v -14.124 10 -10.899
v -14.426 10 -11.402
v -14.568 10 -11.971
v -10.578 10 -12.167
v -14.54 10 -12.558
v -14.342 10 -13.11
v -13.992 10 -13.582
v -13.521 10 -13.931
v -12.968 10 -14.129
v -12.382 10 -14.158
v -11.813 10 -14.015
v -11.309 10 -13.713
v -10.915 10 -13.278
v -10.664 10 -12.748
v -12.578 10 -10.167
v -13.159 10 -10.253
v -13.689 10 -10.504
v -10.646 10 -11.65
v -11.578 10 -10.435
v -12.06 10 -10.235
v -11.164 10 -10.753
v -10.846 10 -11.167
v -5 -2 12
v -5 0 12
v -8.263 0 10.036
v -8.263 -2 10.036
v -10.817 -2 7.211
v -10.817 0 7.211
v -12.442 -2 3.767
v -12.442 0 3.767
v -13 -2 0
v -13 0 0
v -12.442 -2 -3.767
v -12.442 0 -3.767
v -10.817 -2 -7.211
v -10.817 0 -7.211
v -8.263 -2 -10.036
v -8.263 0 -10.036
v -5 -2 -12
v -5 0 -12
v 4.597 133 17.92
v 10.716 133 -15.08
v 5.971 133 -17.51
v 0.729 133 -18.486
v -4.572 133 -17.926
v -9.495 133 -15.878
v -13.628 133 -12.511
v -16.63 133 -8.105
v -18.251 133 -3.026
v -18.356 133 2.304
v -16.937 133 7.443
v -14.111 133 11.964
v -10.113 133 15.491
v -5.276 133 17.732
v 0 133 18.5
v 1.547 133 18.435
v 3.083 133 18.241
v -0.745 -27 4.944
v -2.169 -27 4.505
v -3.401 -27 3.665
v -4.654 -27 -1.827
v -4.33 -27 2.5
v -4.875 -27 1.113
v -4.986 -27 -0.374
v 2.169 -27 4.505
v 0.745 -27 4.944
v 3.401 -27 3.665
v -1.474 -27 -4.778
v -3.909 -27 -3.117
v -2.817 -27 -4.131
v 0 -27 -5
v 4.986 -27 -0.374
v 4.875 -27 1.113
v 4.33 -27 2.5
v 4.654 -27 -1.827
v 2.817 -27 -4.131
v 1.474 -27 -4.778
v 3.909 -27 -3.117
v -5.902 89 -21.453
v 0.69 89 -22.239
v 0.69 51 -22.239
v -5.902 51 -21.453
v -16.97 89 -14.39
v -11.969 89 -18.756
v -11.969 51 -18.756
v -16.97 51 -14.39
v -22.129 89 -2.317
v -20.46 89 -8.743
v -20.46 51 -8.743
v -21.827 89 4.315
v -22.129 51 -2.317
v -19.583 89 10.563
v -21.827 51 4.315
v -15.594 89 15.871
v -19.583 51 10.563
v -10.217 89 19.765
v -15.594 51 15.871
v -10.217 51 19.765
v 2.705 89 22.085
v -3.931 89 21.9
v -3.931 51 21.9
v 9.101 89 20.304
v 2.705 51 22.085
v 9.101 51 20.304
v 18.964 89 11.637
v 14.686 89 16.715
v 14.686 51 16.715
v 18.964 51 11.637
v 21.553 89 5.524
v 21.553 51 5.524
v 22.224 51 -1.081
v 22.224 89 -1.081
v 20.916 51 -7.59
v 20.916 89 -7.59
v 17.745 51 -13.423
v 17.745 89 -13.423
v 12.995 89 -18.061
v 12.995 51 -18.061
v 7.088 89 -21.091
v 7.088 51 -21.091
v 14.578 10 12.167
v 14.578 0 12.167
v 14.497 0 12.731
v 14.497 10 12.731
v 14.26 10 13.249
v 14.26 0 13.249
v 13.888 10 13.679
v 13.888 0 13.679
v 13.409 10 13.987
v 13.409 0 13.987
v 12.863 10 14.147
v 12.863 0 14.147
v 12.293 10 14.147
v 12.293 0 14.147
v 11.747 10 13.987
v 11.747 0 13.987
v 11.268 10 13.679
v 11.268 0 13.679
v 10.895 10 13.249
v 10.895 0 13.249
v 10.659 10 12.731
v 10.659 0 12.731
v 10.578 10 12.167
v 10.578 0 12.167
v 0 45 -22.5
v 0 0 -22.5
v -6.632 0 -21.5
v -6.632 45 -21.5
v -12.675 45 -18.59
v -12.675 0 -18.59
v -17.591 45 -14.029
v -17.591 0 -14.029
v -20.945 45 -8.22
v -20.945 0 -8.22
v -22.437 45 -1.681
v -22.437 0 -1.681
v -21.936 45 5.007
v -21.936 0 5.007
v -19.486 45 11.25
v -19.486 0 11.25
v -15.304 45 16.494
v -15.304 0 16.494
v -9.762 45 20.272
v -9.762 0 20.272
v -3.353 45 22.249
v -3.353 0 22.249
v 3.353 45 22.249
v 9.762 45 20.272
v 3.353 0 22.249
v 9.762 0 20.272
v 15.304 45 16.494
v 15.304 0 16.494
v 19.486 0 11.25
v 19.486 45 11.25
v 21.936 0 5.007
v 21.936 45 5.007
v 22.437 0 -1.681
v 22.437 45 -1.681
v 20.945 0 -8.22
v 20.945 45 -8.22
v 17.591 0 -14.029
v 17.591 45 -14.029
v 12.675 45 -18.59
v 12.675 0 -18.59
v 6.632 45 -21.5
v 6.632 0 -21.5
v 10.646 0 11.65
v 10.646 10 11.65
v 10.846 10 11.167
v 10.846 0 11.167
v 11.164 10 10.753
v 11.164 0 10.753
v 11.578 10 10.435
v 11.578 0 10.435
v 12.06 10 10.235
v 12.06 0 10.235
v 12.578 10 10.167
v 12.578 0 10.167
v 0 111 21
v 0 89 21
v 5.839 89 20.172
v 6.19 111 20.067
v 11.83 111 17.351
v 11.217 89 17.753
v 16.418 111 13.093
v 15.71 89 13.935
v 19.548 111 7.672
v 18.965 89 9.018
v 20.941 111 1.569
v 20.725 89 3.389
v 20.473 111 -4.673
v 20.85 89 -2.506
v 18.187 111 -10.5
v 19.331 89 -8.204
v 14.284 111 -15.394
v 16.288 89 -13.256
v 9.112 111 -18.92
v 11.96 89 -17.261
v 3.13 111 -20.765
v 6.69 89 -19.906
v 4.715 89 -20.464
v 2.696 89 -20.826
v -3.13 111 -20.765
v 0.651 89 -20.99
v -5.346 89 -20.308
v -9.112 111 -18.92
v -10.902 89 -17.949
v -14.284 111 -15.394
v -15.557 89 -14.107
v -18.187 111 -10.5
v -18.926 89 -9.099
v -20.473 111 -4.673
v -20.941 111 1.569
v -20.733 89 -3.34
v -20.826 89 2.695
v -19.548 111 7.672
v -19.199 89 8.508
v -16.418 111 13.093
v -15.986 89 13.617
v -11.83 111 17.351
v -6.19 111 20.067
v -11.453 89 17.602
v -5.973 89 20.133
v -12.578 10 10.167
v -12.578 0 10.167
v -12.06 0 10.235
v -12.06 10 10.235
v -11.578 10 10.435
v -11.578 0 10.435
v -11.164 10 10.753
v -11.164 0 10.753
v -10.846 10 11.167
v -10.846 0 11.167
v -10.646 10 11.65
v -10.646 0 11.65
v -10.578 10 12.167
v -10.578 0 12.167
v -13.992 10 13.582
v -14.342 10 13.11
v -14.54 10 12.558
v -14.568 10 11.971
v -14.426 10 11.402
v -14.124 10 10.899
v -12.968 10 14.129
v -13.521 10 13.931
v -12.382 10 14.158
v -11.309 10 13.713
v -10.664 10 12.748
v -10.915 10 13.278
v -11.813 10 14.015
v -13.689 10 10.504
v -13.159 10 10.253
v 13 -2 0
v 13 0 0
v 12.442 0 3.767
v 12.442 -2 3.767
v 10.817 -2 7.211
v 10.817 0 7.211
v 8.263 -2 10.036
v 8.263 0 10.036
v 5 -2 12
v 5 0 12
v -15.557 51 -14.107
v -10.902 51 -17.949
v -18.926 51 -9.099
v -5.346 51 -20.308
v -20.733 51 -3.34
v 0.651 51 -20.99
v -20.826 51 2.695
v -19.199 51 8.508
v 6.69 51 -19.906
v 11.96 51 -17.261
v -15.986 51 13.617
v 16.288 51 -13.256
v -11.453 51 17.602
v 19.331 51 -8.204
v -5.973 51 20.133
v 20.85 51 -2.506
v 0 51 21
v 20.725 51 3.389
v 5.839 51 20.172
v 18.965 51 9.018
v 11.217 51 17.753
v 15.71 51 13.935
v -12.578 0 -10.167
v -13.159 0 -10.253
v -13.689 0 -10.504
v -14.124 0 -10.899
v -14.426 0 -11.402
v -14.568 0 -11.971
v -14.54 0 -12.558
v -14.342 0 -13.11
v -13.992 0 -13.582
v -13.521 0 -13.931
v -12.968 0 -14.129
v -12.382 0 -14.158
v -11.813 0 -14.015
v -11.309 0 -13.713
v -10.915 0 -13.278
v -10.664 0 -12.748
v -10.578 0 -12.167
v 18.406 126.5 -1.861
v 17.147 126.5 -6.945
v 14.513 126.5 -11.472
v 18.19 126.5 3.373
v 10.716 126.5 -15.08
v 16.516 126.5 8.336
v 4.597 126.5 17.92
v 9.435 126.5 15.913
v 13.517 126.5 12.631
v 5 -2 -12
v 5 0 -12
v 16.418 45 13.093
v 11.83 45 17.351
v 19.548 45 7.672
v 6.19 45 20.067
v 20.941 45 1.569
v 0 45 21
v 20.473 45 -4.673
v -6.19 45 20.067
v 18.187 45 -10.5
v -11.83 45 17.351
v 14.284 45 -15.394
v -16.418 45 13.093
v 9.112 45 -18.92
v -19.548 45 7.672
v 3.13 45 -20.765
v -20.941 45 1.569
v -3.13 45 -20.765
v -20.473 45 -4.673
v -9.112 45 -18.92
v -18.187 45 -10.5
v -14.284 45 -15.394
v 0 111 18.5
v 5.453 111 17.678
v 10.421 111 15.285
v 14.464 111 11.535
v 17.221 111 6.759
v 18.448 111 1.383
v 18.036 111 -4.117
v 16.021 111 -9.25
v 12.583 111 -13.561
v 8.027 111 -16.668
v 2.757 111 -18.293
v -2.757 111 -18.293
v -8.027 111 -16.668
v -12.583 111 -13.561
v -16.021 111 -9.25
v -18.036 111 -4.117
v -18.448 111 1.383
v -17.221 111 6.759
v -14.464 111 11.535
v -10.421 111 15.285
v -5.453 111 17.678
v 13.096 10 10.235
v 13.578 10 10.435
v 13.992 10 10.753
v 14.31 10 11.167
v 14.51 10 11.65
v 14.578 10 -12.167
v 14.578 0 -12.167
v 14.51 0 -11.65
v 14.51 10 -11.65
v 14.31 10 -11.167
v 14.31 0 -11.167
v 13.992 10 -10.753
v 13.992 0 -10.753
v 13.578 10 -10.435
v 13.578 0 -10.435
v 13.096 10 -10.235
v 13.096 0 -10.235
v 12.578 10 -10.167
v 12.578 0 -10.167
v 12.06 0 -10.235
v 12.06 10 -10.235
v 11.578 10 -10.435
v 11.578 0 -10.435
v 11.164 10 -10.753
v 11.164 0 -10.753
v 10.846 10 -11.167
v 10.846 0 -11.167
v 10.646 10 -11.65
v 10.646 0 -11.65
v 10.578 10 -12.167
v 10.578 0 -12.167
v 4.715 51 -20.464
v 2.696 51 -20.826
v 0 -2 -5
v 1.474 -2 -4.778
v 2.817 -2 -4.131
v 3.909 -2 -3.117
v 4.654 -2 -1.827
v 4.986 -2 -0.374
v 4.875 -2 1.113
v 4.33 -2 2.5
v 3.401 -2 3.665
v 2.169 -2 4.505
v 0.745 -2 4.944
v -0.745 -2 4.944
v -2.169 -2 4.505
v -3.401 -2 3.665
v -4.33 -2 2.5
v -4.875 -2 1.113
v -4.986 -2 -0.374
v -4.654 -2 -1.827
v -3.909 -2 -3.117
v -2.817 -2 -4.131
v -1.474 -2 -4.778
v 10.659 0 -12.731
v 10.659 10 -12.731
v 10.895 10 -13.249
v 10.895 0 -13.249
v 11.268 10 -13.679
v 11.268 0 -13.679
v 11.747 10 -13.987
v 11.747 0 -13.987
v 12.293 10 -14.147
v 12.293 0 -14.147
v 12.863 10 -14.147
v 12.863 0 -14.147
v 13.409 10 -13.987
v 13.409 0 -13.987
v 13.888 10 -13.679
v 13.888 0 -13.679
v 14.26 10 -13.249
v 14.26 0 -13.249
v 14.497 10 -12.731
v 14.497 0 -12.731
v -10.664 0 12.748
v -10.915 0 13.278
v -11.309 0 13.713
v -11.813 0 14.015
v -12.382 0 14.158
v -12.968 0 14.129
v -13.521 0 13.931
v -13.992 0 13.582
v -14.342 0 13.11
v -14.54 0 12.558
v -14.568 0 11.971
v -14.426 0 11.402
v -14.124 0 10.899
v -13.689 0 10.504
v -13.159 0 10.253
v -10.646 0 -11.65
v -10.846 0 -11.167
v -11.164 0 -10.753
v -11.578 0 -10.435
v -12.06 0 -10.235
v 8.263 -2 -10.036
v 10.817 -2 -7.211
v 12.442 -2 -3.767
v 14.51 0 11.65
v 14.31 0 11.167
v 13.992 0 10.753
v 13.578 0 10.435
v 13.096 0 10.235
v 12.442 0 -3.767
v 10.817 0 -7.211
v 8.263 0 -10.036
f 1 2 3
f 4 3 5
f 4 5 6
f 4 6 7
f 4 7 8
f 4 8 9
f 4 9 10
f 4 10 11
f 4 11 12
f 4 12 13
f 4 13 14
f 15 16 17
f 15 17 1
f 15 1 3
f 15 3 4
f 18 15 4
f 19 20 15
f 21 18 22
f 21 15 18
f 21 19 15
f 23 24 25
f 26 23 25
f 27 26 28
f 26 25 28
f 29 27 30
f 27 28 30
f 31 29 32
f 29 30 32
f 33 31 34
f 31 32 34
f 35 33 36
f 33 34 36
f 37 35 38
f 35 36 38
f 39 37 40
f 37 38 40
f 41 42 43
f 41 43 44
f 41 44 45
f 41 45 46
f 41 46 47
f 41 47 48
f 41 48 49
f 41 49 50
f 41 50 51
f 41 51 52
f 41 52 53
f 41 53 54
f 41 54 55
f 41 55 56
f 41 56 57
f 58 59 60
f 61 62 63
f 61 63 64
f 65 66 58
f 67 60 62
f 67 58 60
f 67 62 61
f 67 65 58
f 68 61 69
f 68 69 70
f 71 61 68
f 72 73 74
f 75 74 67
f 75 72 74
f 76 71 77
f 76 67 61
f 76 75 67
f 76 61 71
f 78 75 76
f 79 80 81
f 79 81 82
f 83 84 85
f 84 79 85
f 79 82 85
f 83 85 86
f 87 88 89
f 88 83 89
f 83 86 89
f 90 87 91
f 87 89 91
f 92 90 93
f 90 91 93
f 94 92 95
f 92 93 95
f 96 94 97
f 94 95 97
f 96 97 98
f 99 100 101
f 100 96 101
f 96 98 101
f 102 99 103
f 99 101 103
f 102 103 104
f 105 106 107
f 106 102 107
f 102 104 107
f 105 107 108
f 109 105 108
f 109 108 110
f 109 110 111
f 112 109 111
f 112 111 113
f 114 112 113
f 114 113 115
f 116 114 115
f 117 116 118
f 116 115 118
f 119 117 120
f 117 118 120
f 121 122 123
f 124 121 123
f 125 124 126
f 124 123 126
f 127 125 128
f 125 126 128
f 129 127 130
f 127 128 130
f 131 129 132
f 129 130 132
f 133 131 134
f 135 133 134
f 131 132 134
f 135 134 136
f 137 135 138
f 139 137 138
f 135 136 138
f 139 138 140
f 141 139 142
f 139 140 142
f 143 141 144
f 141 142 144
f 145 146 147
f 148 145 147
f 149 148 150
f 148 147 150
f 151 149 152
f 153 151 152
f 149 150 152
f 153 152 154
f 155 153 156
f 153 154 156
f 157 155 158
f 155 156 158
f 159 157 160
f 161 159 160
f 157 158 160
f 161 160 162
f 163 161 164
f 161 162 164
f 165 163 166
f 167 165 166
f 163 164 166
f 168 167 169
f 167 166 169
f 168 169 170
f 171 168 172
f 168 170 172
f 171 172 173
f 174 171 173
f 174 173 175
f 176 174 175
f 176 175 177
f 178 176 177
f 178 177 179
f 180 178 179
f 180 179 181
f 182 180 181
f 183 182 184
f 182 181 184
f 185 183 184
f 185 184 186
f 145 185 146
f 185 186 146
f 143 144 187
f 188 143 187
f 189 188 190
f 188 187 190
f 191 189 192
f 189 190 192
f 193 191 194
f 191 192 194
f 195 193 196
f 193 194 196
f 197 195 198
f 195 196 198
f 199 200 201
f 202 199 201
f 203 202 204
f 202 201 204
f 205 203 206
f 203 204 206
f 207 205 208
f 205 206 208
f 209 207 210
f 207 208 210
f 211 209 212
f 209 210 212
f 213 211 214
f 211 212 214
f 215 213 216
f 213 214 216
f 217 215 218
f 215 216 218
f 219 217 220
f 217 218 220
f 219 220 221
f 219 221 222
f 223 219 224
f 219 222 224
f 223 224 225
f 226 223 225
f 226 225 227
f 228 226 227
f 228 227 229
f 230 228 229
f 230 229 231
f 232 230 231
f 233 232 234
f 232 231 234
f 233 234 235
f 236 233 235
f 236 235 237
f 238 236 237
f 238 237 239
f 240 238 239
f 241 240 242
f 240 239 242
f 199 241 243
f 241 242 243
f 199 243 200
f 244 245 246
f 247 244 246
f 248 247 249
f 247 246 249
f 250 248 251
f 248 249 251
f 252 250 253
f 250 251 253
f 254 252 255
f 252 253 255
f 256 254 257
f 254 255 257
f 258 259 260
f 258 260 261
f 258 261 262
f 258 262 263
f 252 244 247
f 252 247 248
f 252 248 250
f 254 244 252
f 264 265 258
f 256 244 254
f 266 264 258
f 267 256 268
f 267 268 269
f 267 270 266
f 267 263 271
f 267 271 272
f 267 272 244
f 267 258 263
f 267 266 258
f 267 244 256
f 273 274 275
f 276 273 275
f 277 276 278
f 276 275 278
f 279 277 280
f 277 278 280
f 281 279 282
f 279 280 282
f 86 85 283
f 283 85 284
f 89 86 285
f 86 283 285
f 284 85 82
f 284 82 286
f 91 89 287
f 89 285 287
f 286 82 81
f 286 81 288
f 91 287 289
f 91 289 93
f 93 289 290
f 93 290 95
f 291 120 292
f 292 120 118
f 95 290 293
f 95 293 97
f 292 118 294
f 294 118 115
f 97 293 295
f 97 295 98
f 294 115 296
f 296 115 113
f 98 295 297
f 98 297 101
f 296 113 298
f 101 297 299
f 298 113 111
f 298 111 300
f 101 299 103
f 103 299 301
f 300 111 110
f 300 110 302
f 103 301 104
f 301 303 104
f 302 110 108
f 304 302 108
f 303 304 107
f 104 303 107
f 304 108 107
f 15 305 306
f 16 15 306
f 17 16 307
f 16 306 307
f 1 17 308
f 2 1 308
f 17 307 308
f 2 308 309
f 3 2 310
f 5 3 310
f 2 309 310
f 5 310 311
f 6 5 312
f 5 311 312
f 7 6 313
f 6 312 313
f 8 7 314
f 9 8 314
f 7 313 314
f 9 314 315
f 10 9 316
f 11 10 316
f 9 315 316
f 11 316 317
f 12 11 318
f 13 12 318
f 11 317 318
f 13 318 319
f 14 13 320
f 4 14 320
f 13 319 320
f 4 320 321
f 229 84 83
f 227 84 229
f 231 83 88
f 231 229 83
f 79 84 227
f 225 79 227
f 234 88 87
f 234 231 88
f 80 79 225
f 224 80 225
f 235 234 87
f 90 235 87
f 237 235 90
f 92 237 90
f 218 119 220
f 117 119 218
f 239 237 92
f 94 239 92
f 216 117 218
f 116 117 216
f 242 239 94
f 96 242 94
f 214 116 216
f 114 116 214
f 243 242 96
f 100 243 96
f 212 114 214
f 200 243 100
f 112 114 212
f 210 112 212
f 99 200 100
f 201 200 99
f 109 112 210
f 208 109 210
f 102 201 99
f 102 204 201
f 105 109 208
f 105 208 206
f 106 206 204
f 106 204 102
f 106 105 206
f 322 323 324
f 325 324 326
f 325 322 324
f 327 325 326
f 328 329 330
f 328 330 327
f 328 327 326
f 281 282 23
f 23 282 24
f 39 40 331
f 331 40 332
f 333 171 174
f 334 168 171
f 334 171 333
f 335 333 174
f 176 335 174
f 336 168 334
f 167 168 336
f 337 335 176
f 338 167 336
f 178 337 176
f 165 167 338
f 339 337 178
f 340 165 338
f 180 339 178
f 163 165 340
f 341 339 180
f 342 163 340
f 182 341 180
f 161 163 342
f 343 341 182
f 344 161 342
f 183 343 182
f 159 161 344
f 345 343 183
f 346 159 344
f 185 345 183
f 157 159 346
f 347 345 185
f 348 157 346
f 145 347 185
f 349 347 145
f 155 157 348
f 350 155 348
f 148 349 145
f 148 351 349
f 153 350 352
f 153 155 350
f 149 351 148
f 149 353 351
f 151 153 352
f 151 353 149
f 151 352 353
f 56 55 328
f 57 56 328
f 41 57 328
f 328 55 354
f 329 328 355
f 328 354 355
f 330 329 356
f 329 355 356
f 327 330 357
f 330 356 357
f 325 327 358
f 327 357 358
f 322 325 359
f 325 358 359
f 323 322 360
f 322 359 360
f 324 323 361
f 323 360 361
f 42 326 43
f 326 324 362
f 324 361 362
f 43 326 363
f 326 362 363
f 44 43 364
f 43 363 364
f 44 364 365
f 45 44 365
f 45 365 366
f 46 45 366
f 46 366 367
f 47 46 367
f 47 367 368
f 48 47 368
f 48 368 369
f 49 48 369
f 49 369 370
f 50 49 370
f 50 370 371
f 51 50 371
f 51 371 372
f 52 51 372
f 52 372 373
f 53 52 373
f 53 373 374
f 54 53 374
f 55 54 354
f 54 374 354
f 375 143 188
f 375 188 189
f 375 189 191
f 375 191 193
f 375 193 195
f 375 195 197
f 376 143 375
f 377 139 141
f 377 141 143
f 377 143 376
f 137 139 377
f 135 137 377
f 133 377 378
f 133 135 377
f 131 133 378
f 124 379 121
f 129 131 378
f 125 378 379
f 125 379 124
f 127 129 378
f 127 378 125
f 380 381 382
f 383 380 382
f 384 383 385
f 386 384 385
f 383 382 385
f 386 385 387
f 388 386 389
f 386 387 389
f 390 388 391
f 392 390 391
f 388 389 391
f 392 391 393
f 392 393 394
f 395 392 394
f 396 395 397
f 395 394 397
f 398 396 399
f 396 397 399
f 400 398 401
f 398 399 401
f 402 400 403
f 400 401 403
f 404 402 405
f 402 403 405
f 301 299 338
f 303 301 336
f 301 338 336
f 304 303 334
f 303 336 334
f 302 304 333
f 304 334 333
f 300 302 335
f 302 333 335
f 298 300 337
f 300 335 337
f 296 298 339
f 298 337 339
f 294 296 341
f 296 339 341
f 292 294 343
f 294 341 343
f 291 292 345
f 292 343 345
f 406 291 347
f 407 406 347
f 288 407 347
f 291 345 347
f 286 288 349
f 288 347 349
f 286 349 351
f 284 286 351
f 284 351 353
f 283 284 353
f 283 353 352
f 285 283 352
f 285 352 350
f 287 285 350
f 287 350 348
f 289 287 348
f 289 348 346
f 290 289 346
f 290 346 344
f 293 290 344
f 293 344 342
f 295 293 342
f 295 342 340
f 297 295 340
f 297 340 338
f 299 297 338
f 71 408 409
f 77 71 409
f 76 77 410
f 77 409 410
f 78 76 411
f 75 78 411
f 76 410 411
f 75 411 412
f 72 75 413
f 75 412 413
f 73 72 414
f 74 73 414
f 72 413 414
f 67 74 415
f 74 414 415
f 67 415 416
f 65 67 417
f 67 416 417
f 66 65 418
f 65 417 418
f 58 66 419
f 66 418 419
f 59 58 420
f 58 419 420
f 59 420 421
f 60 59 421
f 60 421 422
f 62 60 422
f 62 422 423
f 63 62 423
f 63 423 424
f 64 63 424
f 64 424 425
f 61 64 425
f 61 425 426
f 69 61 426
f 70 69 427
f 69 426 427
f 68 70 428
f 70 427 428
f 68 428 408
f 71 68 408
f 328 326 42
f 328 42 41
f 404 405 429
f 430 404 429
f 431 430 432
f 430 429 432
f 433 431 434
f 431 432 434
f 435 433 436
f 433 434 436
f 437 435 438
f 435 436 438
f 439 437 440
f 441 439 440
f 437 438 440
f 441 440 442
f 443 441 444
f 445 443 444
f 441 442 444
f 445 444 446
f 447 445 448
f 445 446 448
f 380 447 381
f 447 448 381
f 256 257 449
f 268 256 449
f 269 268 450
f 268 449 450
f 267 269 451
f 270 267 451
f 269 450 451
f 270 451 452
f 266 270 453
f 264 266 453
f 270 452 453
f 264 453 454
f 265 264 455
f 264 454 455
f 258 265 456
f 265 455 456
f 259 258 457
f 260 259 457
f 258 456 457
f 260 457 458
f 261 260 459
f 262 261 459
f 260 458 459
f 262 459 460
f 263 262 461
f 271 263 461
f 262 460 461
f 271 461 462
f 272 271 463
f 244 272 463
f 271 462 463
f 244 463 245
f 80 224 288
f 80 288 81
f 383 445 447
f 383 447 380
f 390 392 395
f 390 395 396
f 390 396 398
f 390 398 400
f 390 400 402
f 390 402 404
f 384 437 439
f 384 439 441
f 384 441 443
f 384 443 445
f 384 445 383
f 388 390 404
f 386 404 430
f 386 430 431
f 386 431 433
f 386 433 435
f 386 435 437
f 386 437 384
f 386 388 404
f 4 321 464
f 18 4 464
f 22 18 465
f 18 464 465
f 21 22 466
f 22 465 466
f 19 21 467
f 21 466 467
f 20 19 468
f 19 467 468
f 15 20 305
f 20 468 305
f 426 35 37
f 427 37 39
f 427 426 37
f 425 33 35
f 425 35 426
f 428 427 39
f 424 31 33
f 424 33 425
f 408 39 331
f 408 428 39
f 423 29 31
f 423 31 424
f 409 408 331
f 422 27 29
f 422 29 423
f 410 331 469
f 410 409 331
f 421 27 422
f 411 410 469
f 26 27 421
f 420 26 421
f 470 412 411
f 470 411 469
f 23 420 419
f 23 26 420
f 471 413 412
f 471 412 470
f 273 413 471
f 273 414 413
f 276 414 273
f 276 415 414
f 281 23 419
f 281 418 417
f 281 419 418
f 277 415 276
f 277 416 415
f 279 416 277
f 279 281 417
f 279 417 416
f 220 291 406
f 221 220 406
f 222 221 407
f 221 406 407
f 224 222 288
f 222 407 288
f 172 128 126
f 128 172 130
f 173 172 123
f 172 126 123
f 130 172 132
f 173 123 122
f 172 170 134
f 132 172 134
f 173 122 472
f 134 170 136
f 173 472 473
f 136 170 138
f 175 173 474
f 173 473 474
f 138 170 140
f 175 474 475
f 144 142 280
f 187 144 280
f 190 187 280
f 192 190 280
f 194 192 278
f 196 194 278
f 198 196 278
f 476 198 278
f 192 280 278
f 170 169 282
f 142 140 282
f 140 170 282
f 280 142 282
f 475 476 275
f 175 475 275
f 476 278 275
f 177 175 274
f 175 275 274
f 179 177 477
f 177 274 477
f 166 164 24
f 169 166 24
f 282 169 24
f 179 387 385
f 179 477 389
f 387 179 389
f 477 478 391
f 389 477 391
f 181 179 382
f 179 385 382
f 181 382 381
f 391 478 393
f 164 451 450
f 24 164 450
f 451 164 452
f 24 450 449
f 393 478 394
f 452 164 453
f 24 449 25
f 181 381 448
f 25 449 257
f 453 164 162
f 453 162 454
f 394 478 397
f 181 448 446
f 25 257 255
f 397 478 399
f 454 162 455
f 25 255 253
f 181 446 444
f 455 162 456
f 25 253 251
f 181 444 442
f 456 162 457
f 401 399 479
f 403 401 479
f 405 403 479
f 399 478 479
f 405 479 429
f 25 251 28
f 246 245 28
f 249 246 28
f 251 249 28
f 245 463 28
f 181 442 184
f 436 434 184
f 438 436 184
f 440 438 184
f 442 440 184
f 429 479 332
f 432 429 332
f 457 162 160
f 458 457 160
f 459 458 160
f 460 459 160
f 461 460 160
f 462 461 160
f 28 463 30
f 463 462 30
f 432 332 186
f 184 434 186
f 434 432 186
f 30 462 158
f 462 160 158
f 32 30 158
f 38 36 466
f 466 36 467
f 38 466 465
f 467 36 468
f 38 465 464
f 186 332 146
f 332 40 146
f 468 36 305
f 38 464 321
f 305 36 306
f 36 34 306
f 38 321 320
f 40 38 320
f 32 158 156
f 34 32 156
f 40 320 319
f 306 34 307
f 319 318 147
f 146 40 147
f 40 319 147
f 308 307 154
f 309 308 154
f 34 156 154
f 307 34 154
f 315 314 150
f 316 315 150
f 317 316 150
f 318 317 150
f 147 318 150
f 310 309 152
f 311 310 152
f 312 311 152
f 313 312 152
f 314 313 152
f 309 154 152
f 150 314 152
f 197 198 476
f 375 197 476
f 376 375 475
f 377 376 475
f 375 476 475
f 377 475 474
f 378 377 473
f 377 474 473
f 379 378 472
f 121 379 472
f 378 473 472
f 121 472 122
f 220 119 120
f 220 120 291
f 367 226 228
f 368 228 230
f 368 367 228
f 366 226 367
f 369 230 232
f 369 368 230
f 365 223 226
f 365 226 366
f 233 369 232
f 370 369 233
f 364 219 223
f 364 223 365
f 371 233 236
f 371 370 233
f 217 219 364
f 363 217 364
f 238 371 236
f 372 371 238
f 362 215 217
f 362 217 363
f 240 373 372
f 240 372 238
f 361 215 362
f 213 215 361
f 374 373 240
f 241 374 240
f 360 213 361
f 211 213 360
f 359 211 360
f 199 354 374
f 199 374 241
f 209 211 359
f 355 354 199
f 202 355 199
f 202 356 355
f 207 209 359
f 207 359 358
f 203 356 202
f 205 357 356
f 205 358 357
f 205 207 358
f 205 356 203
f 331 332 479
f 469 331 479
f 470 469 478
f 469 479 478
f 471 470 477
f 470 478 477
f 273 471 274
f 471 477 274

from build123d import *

# Parameters (mm, degrees)
SKETCH5_R            = 22.5
BOSS_EXTRUDE4_DEPTH  = 45
SKETCH6_R            = 21
BOSS_EXTRUDE5_DEPTH  = 6
SKETCH7_R            = 22.25
BOSS_EXTRUDE6_DEPTH  = 38
SKETCH8_R            = 21
BOSS_EXTRUDE7_DEPTH  = 22
SKETCH9_R            = 18.5
BOSS_EXTRUDE9_DEPTH  = 22
CUT_EXTRUDE1_START   = -6.5
CUT_EXTRUDE1_DEPTH   = 6.5
CUT_EXTRUDE3_START   = -38
CUT_EXTRUDE3_DEPTH   = 38
BOSS_EXTRUDE11_DEPTH = 2
SKETCH19_R           = 5
BOSS_EXTRUDE12_DEPTH = 25
CUT_EXTRUDE4_DEPTH   = 10


with BuildPart() as part:
    # Sketch5 → Boss-Extrude4 (new body)
    with BuildSketch(Plane(origin=(0, 0, 0), x_dir=(1, 0, 0), z_dir=(0, 1, 0))):
        with Locations(Location((0, 0, 0), (0, 0, 90))):
            Circle(SKETCH5_R)
    extrude(amount=BOSS_EXTRUDE4_DEPTH)

    # Sketch6 → Boss-Extrude5 (add)
    with BuildSketch(Plane(origin=(0, 45, 0), x_dir=(-1, 0, 0), z_dir=(0, 1, 0))):
        with Locations(Location((0, 0, 0), (0, 0, 90))):
            Circle(SKETCH6_R)
    extrude(amount=BOSS_EXTRUDE5_DEPTH)

    # Sketch7 → Boss-Extrude6 (add)
    with BuildSketch(Plane(origin=(0, 51, 0), x_dir=(-1, 0, 0), z_dir=(0, 1, 0))):
        with Locations(Location((0, 0, 0), (0, 0, 90))):
            Circle(SKETCH7_R)
    extrude(amount=BOSS_EXTRUDE6_DEPTH)

    # Sketch8 → Boss-Extrude7 (add)
    with BuildSketch(Plane(origin=(0, 89, 0), x_dir=(-1, 0, 0), z_dir=(0, 1, 0))):
        with Locations(Location((0, 0, 0), (0, 0, 90))):
            Circle(SKETCH8_R)
    extrude(amount=BOSS_EXTRUDE7_DEPTH)

    # Sketch9 → Boss-Extrude9 (add)
    with BuildSketch(Plane(origin=(0, 111, 0), x_dir=(-1, 0, 0), z_dir=(0, 1, 0))):
        with Locations(Location((0, 0, 0), (0, 0, 90))):
            Circle(SKETCH9_R)
    extrude(amount=BOSS_EXTRUDE9_DEPTH)

    # Sketch10 → Cut-Extrude1 (cut)
    with BuildSketch(Plane(origin=(0, 133, 0), x_dir=(-1, 0, 0), z_dir=(0, 1, 0)).offset(CUT_EXTRUDE1_START)):
        with BuildLine():
            Line((-10.71607179, -15.080311847), (-4.597257497, 17.919688153))
            ThreePointArc((-4.597257497, 17.919688153), (-18.18995639, 3.372756519), (-10.71607179, -15.080311847))
        make_face()
    extrude(amount=CUT_EXTRUDE1_DEPTH, mode=Mode.SUBTRACT)

    # Sketch16 → Cut-Extrude3 (cut)
    with BuildSketch(Plane(origin=(0, 89, 0), x_dir=(1, 0, 0), z_dir=(0, 1, 0)).offset(CUT_EXTRUDE3_START)):
        with BuildLine():
            Line((0.651202062, 20.989900807), (0.68996409, 22.239299664))
            ThreePointArc((0.68996409, 22.239299664), (3.931001005, 21.899993861), (7.087715105, 21.090917348))
            Line((7.087715105, 21.090917348), (6.689528863, 19.906034351))
            ThreePointArc((6.689528863, 19.906034351), (3.710158252, 20.669657127), (0.651202062, 20.989900807))
        make_face()
    extrude(amount=CUT_EXTRUDE3_DEPTH, mode=Mode.SUBTRACT)

    # Sketch17 → Boss-Extrude11 (add)
    with BuildSketch(Plane.XZ):
        with BuildLine():
            ThreePointArc((-5, 12), (-13, 0), (-5, -12))
            Line((-5, -12), (5, -12))
            ThreePointArc((5, -12), (10.816653826, -7.211102551), (13, 0))
            ThreePointArc((13, 0), (10.816653826, 7.211102551), (5, 12))
            Line((5, 12), (-5, 12))
        make_face()
    extrude(amount=BOSS_EXTRUDE11_DEPTH)

    # Sketch19 → Boss-Extrude12 (add)
    with BuildSketch(Plane.XZ.offset(2)):
        with Locations(Location((0, 0, 0), (0, 0, 270))):
            Circle(SKETCH19_R)
    extrude(amount=BOSS_EXTRUDE12_DEPTH)

    # Sketch20 → Cut-Extrude4 (cut)
    with BuildSketch(Plane.XZ):
        with BuildLine():
            ThreePointArc((-10.577989001, 12.167341234), (-13.992202563, 13.581554796), (-12.577989001, 10.167341234))
            Line((-12.577989001, 10.167341234), (-12.577989001, 12.167341234))
            Line((-12.577989001, 12.167341234), (-10.577989001, 12.167341234))
        make_face()
        with BuildLine():
            Line((-12.577989001, 12.167341234), (-12.577989001, 10.167341234))
            ThreePointArc((-12.577989001, 10.167341234), (-11.163775438, 10.753127672), (-10.577989001, 12.167341234))
            Line((-10.577989001, 12.167341234), (-12.577989001, 12.167341234))
        make_face()
        with BuildLine():
            Line((-12.577989001, -10.167341234), (-12.577989001, -12.167341234))
            Line((-12.577989001, -12.167341234), (-10.577989001, -12.167341234))
            ThreePointArc((-10.577989001, -12.167341234), (-11.163775438, -10.753127672), (-12.577989001, -10.167341234))
        make_face()
        with BuildLine():
            Line((-10.577989001, -12.167341234), (-12.577989001, -12.167341234))
            Line((-12.577989001, -12.167341234), (-12.577989001, -10.167341234))
            ThreePointArc((-12.577989001, -10.167341234), (-13.992202563, -13.581554796), (-10.577989001, -12.167341234))
        make_face()
        with BuildLine():
            ThreePointArc((12.577989001, -10.167341234), (11.163775438, -10.753127672), (10.577989001, -12.167341234))
            Line((10.577989001, -12.167341234), (12.577989001, -12.167341234))
            Line((12.577989001, -12.167341234), (12.577989001, -10.167341234))
        make_face()
        with BuildLine():
            Line((12.577989001, -12.167341234), (10.577989001, -12.167341234))
            ThreePointArc((10.577989001, -12.167341234), (12.577989001, -14.167341234), (14.577989001, -12.167341234))
            ThreePointArc((14.577989001, -12.167341234), (13.992202563, -10.753127672), (12.577989001, -10.167341234))
            Line((12.577989001, -10.167341234), (12.577989001, -12.167341234))
        make_face()
        with BuildLine():
            ThreePointArc((10.577989001, 12.167341234), (11.163775438, 10.753127672), (12.577989001, 10.167341234))
            Line((12.577989001, 10.167341234), (12.577989001, 12.167341234))
            Line((12.577989001, 12.167341234), (10.577989001, 12.167341234))
        make_face()
        with BuildLine():
            Line((12.577989001, 12.167341234), (12.577989001, 10.167341234))
            ThreePointArc((12.577989001, 10.167341234), (13.992202563, 10.753127672), (14.577989001, 12.167341234))
            ThreePointArc((14.577989001, 12.167341234), (12.577989001, 14.167341234), (10.577989001, 12.167341234))
            Line((10.577989001, 12.167341234), (12.577989001, 12.167341234))
        make_face()
    extrude(amount=-CUT_EXTRUDE4_DEPTH, mode=Mode.SUBTRACT)


solid = part.part
